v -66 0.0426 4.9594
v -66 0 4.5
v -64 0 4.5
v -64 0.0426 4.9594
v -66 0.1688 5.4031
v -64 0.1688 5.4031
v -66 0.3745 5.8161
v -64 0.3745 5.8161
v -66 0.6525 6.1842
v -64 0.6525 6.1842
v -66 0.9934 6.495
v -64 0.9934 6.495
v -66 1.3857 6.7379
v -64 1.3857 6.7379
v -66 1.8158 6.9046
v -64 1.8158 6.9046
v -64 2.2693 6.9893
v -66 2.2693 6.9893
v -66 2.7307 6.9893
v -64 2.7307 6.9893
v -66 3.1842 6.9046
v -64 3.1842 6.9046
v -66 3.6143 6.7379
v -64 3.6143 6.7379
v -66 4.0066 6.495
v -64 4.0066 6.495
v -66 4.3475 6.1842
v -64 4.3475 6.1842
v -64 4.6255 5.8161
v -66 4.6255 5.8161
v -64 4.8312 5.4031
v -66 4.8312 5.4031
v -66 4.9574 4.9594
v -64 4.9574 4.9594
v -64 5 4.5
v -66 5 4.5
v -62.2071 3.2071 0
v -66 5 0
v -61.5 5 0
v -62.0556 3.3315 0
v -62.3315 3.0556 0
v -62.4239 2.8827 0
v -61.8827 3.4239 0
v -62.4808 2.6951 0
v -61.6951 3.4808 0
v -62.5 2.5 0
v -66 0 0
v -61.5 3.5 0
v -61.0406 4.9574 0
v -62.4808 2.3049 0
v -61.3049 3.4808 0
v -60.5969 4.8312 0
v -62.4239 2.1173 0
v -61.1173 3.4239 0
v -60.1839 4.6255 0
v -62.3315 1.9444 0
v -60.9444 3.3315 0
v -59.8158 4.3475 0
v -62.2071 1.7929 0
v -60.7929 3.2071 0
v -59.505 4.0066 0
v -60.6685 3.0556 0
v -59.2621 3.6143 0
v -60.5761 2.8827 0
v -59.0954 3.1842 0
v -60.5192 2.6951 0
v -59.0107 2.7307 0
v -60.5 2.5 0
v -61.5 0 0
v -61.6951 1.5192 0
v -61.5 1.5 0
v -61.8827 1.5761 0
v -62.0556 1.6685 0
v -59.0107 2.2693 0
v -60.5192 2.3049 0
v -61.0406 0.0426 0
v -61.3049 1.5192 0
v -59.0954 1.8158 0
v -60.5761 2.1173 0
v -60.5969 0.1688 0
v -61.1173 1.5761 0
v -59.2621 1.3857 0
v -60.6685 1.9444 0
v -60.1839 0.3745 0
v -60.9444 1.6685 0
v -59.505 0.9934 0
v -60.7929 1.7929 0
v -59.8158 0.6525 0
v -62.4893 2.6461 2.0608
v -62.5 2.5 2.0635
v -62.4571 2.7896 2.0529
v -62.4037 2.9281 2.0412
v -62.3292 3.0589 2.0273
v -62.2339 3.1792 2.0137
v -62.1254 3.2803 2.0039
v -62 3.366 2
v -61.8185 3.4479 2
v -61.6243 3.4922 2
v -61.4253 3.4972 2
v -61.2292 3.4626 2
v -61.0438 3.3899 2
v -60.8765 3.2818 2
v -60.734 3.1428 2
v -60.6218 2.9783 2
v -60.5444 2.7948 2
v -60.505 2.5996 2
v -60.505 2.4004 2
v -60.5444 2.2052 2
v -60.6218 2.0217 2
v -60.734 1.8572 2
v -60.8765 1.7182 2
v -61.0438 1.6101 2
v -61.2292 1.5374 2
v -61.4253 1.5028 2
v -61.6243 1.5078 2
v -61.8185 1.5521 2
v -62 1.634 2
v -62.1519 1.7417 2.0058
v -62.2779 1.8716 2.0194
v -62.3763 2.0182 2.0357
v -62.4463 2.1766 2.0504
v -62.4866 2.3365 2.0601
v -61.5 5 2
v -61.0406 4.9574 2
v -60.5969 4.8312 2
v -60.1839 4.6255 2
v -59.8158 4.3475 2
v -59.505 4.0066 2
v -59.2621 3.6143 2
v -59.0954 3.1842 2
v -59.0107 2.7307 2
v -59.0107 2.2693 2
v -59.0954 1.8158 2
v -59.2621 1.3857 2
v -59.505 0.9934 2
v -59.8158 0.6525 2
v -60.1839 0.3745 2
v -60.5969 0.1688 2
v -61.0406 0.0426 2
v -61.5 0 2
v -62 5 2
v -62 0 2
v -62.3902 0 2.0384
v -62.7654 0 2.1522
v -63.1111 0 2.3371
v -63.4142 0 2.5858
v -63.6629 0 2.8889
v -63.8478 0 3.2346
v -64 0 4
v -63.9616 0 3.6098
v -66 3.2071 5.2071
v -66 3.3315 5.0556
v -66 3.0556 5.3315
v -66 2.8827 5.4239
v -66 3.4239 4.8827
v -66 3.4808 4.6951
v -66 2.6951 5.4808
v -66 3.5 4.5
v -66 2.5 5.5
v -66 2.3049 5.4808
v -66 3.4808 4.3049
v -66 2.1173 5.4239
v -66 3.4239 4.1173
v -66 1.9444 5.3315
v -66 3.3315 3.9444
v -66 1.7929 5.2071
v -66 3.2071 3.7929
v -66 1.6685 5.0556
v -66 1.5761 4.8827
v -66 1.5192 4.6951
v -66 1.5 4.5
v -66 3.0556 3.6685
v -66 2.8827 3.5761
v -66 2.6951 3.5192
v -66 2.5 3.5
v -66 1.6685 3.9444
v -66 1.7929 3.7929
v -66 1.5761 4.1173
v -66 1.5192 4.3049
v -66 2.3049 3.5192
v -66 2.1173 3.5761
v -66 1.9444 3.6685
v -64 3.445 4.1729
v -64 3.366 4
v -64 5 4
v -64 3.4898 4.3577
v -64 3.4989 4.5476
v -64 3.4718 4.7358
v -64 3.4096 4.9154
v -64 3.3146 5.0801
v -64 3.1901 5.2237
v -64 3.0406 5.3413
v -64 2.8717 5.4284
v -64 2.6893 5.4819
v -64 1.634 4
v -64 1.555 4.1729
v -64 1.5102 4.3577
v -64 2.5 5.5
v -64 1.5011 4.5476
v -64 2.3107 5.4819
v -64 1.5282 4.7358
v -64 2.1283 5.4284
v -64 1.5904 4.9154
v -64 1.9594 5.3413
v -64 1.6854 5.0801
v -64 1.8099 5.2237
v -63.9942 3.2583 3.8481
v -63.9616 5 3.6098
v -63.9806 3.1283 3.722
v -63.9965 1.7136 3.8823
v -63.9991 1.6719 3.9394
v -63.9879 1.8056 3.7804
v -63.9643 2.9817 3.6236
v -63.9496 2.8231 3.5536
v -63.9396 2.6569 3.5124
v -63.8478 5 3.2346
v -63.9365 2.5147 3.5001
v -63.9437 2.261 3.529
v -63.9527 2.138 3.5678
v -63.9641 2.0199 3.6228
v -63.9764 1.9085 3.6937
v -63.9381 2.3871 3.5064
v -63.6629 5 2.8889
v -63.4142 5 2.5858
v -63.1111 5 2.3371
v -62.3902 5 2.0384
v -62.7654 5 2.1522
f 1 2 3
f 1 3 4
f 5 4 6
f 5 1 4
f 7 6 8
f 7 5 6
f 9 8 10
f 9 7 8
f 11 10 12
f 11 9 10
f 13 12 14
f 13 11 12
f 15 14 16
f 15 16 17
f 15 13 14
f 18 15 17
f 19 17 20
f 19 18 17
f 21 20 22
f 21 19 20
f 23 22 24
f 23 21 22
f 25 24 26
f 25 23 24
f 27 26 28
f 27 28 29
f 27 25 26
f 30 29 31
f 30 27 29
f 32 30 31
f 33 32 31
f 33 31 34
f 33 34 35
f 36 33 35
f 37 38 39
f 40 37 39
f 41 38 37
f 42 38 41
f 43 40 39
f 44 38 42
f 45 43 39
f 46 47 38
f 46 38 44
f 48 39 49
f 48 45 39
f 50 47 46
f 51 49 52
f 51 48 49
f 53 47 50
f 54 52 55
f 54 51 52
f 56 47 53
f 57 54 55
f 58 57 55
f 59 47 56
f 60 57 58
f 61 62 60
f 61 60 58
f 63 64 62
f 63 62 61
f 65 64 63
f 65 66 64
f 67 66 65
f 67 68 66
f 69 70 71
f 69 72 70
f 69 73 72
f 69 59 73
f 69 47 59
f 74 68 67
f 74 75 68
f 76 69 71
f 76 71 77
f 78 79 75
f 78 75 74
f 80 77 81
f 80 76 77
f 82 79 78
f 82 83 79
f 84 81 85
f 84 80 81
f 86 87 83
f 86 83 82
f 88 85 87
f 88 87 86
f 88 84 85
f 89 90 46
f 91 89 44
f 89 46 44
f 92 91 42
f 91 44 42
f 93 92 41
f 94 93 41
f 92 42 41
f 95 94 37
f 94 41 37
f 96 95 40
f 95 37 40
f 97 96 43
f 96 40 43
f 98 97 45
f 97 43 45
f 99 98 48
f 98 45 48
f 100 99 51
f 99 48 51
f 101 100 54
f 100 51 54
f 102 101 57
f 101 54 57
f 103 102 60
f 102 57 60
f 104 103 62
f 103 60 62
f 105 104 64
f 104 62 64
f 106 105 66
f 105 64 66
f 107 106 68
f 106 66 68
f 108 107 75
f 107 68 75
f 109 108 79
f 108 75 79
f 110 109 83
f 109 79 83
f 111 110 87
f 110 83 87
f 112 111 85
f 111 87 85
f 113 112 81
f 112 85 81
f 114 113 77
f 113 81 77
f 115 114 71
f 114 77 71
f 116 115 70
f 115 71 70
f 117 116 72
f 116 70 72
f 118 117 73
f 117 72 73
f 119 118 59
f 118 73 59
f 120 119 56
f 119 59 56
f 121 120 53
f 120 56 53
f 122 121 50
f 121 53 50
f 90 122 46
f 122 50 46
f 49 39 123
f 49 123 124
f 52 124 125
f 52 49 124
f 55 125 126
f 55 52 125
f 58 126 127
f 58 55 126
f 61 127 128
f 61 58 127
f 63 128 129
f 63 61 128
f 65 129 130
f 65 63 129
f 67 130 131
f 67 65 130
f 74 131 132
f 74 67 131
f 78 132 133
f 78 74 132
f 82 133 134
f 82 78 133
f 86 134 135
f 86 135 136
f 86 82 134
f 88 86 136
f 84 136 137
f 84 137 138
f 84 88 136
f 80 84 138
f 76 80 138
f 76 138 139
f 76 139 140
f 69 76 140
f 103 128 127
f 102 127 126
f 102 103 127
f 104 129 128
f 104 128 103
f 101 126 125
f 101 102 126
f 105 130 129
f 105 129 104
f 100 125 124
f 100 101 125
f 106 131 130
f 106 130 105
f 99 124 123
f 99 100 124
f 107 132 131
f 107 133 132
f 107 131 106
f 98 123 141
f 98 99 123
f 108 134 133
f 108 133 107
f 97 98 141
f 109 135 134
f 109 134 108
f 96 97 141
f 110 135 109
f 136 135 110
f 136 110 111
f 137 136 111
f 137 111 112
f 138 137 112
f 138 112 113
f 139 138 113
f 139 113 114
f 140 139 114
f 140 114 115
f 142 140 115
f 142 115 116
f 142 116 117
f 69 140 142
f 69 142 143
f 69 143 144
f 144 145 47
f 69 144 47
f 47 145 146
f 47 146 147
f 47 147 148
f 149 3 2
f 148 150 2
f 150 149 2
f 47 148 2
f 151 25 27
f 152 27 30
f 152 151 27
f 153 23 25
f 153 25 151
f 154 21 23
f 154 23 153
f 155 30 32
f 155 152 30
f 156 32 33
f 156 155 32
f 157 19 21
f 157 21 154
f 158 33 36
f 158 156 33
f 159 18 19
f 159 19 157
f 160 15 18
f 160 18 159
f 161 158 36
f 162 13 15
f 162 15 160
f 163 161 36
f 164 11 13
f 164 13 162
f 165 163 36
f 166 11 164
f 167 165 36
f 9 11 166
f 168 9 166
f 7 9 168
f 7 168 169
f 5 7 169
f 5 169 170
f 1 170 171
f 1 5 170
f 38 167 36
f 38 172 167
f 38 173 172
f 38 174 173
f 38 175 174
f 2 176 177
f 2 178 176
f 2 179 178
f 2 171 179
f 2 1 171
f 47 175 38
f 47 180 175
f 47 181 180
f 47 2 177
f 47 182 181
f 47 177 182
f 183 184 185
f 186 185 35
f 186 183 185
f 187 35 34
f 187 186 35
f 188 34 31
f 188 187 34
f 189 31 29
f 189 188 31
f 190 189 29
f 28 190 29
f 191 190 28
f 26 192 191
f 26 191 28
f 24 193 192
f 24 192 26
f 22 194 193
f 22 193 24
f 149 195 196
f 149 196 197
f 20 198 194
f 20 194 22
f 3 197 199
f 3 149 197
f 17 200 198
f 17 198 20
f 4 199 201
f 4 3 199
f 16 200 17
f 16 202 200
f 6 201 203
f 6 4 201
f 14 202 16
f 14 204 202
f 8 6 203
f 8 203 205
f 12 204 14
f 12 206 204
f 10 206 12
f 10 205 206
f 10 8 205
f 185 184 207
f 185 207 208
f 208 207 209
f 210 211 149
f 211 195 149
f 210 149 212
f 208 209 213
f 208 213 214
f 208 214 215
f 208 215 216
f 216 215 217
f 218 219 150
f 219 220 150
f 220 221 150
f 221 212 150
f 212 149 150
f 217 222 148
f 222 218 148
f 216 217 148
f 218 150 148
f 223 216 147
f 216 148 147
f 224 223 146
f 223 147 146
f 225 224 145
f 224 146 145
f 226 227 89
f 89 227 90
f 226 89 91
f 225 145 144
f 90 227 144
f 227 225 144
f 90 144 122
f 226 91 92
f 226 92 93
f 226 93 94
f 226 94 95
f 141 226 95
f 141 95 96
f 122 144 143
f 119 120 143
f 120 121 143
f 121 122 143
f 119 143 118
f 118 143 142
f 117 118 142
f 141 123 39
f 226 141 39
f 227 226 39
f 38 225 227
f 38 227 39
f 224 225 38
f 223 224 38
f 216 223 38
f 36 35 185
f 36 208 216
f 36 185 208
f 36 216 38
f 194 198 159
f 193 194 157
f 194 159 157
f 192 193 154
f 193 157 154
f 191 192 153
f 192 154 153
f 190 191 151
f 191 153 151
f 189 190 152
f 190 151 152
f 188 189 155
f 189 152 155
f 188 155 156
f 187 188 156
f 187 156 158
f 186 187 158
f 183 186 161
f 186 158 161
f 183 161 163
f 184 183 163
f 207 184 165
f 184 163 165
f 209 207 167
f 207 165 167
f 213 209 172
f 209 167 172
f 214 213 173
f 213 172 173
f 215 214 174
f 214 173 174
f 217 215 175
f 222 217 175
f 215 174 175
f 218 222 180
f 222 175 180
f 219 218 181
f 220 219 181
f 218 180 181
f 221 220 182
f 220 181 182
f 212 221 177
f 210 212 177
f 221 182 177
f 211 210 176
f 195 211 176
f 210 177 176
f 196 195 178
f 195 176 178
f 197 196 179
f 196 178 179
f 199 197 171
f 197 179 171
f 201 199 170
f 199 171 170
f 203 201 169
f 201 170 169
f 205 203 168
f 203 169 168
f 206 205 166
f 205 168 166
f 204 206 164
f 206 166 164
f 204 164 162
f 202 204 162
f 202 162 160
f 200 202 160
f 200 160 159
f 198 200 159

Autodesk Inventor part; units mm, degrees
ref_plane "YZ Plane" through (0, 0, 0) normal (1, 0, 0) x (0, 1, 0)
ref_plane "XZ Plane" through (0, 0, 0) normal (0, 1, 0) x (-1, 0, 0)
ref_plane "XY Plane" through (0, 0, 0) normal (0, 0, 1) x (1, 0, 0)
sketch "Esboço1" plane through (0, 0, 0) normal (0, 1, 0) x (-1, 0, 0)
  line L0 (66, 0) -> (59, 0)
  line L1 (59, 0) -> (59, 2)
  line L2 (59, 2) -> (62, 2)
  line L3 (66, 2) -> (66, 0)
  line L4 (66, 0) -> (64, 0)
  line L5 (64, 4) -> (64, 7)
  line L6 (64, 7) -> (66, 7)
  line L7 (66, 7) -> (66, 0)
  arc A0 (62, 2) -> (64, 4) centre (62, 4) ccw
  point P0 (0, 0)
  dimension "d0" = 2
extrude "Extrusão1" add sketch "Esboço1" along normal blind 5
sketch "Esboço2" plane through (-59, 0, 0) normal (0, 0, -1) x (-1, 0, 0)
  circle A0 centre (2.5, 2.5) radius 1
  line L0 (0, 0) -> (7, 0) projected
  line L1 (0, 0) -> (0, 5) projected
  arc A1 (2.5, 5) -> (2.5, 0) centre (2.5, 2.5) ccw
  line L2 (3, 0) -> (0, 0) projected
  line L3 (3, 5) -> (0, 5) projected
  line L4 (2.5, 0) -> (0, 0)
  line L5 (0, 0) -> (0, 5)
  line L6 (0, 5) -> (2.5, 5)
  point P0 (-59, 0)
  point P1 (0, 2.5)
  dimension "d3" = 2
  dimension "d4" = 2.5
  dimension "d5" = 2.5
extrude "Extrusão2" cut sketch "Esboço2" against normal blind 4.25
sketch "Esboço3" plane through (-66, 0, 0) normal (-1, 0, 0) x (0, 0, 1)
  circle A0 centre (4.5, 2.5) radius 1
  line L0 (0, 5) -> (7, 5) projected
  line L1 (7, 0) -> (7, 5) projected
  arc A1 (4.5, 0) -> (4.5, 5) centre (4.5, 2.5) ccw
  line L2 (7, 0) -> (4, 0) projected
  line L3 (7, 5) -> (4, 5) projected
  line L4 (4.5, 0) -> (7, 0)
  line L5 (7, 0) -> (7, 5)
  line L6 (7, 5) -> (4.5, 5)
  point P0 (0, 0)
  point P1 (4.5, 5)
  point P2 (7, 2.5)
  dimension "d8" = 2.5
  dimension "d9" = 2.5
extrude "Extrusão3" cut sketch "Esboço3" against normal blind 4.25
sketch "Esboço4" plane through (-66, 0, 0) normal (0, 0, -1) x (-1, 0, 0)
  line L0 (0, -91.1) -> (0, 5) projected
  line L1 (-4.5, 0) -> (0, 0) projected
  line L2 (-4.5, 5) -> (0, 5) projected
  point P0 (-66, 0)
properties part number "conector 90°"
